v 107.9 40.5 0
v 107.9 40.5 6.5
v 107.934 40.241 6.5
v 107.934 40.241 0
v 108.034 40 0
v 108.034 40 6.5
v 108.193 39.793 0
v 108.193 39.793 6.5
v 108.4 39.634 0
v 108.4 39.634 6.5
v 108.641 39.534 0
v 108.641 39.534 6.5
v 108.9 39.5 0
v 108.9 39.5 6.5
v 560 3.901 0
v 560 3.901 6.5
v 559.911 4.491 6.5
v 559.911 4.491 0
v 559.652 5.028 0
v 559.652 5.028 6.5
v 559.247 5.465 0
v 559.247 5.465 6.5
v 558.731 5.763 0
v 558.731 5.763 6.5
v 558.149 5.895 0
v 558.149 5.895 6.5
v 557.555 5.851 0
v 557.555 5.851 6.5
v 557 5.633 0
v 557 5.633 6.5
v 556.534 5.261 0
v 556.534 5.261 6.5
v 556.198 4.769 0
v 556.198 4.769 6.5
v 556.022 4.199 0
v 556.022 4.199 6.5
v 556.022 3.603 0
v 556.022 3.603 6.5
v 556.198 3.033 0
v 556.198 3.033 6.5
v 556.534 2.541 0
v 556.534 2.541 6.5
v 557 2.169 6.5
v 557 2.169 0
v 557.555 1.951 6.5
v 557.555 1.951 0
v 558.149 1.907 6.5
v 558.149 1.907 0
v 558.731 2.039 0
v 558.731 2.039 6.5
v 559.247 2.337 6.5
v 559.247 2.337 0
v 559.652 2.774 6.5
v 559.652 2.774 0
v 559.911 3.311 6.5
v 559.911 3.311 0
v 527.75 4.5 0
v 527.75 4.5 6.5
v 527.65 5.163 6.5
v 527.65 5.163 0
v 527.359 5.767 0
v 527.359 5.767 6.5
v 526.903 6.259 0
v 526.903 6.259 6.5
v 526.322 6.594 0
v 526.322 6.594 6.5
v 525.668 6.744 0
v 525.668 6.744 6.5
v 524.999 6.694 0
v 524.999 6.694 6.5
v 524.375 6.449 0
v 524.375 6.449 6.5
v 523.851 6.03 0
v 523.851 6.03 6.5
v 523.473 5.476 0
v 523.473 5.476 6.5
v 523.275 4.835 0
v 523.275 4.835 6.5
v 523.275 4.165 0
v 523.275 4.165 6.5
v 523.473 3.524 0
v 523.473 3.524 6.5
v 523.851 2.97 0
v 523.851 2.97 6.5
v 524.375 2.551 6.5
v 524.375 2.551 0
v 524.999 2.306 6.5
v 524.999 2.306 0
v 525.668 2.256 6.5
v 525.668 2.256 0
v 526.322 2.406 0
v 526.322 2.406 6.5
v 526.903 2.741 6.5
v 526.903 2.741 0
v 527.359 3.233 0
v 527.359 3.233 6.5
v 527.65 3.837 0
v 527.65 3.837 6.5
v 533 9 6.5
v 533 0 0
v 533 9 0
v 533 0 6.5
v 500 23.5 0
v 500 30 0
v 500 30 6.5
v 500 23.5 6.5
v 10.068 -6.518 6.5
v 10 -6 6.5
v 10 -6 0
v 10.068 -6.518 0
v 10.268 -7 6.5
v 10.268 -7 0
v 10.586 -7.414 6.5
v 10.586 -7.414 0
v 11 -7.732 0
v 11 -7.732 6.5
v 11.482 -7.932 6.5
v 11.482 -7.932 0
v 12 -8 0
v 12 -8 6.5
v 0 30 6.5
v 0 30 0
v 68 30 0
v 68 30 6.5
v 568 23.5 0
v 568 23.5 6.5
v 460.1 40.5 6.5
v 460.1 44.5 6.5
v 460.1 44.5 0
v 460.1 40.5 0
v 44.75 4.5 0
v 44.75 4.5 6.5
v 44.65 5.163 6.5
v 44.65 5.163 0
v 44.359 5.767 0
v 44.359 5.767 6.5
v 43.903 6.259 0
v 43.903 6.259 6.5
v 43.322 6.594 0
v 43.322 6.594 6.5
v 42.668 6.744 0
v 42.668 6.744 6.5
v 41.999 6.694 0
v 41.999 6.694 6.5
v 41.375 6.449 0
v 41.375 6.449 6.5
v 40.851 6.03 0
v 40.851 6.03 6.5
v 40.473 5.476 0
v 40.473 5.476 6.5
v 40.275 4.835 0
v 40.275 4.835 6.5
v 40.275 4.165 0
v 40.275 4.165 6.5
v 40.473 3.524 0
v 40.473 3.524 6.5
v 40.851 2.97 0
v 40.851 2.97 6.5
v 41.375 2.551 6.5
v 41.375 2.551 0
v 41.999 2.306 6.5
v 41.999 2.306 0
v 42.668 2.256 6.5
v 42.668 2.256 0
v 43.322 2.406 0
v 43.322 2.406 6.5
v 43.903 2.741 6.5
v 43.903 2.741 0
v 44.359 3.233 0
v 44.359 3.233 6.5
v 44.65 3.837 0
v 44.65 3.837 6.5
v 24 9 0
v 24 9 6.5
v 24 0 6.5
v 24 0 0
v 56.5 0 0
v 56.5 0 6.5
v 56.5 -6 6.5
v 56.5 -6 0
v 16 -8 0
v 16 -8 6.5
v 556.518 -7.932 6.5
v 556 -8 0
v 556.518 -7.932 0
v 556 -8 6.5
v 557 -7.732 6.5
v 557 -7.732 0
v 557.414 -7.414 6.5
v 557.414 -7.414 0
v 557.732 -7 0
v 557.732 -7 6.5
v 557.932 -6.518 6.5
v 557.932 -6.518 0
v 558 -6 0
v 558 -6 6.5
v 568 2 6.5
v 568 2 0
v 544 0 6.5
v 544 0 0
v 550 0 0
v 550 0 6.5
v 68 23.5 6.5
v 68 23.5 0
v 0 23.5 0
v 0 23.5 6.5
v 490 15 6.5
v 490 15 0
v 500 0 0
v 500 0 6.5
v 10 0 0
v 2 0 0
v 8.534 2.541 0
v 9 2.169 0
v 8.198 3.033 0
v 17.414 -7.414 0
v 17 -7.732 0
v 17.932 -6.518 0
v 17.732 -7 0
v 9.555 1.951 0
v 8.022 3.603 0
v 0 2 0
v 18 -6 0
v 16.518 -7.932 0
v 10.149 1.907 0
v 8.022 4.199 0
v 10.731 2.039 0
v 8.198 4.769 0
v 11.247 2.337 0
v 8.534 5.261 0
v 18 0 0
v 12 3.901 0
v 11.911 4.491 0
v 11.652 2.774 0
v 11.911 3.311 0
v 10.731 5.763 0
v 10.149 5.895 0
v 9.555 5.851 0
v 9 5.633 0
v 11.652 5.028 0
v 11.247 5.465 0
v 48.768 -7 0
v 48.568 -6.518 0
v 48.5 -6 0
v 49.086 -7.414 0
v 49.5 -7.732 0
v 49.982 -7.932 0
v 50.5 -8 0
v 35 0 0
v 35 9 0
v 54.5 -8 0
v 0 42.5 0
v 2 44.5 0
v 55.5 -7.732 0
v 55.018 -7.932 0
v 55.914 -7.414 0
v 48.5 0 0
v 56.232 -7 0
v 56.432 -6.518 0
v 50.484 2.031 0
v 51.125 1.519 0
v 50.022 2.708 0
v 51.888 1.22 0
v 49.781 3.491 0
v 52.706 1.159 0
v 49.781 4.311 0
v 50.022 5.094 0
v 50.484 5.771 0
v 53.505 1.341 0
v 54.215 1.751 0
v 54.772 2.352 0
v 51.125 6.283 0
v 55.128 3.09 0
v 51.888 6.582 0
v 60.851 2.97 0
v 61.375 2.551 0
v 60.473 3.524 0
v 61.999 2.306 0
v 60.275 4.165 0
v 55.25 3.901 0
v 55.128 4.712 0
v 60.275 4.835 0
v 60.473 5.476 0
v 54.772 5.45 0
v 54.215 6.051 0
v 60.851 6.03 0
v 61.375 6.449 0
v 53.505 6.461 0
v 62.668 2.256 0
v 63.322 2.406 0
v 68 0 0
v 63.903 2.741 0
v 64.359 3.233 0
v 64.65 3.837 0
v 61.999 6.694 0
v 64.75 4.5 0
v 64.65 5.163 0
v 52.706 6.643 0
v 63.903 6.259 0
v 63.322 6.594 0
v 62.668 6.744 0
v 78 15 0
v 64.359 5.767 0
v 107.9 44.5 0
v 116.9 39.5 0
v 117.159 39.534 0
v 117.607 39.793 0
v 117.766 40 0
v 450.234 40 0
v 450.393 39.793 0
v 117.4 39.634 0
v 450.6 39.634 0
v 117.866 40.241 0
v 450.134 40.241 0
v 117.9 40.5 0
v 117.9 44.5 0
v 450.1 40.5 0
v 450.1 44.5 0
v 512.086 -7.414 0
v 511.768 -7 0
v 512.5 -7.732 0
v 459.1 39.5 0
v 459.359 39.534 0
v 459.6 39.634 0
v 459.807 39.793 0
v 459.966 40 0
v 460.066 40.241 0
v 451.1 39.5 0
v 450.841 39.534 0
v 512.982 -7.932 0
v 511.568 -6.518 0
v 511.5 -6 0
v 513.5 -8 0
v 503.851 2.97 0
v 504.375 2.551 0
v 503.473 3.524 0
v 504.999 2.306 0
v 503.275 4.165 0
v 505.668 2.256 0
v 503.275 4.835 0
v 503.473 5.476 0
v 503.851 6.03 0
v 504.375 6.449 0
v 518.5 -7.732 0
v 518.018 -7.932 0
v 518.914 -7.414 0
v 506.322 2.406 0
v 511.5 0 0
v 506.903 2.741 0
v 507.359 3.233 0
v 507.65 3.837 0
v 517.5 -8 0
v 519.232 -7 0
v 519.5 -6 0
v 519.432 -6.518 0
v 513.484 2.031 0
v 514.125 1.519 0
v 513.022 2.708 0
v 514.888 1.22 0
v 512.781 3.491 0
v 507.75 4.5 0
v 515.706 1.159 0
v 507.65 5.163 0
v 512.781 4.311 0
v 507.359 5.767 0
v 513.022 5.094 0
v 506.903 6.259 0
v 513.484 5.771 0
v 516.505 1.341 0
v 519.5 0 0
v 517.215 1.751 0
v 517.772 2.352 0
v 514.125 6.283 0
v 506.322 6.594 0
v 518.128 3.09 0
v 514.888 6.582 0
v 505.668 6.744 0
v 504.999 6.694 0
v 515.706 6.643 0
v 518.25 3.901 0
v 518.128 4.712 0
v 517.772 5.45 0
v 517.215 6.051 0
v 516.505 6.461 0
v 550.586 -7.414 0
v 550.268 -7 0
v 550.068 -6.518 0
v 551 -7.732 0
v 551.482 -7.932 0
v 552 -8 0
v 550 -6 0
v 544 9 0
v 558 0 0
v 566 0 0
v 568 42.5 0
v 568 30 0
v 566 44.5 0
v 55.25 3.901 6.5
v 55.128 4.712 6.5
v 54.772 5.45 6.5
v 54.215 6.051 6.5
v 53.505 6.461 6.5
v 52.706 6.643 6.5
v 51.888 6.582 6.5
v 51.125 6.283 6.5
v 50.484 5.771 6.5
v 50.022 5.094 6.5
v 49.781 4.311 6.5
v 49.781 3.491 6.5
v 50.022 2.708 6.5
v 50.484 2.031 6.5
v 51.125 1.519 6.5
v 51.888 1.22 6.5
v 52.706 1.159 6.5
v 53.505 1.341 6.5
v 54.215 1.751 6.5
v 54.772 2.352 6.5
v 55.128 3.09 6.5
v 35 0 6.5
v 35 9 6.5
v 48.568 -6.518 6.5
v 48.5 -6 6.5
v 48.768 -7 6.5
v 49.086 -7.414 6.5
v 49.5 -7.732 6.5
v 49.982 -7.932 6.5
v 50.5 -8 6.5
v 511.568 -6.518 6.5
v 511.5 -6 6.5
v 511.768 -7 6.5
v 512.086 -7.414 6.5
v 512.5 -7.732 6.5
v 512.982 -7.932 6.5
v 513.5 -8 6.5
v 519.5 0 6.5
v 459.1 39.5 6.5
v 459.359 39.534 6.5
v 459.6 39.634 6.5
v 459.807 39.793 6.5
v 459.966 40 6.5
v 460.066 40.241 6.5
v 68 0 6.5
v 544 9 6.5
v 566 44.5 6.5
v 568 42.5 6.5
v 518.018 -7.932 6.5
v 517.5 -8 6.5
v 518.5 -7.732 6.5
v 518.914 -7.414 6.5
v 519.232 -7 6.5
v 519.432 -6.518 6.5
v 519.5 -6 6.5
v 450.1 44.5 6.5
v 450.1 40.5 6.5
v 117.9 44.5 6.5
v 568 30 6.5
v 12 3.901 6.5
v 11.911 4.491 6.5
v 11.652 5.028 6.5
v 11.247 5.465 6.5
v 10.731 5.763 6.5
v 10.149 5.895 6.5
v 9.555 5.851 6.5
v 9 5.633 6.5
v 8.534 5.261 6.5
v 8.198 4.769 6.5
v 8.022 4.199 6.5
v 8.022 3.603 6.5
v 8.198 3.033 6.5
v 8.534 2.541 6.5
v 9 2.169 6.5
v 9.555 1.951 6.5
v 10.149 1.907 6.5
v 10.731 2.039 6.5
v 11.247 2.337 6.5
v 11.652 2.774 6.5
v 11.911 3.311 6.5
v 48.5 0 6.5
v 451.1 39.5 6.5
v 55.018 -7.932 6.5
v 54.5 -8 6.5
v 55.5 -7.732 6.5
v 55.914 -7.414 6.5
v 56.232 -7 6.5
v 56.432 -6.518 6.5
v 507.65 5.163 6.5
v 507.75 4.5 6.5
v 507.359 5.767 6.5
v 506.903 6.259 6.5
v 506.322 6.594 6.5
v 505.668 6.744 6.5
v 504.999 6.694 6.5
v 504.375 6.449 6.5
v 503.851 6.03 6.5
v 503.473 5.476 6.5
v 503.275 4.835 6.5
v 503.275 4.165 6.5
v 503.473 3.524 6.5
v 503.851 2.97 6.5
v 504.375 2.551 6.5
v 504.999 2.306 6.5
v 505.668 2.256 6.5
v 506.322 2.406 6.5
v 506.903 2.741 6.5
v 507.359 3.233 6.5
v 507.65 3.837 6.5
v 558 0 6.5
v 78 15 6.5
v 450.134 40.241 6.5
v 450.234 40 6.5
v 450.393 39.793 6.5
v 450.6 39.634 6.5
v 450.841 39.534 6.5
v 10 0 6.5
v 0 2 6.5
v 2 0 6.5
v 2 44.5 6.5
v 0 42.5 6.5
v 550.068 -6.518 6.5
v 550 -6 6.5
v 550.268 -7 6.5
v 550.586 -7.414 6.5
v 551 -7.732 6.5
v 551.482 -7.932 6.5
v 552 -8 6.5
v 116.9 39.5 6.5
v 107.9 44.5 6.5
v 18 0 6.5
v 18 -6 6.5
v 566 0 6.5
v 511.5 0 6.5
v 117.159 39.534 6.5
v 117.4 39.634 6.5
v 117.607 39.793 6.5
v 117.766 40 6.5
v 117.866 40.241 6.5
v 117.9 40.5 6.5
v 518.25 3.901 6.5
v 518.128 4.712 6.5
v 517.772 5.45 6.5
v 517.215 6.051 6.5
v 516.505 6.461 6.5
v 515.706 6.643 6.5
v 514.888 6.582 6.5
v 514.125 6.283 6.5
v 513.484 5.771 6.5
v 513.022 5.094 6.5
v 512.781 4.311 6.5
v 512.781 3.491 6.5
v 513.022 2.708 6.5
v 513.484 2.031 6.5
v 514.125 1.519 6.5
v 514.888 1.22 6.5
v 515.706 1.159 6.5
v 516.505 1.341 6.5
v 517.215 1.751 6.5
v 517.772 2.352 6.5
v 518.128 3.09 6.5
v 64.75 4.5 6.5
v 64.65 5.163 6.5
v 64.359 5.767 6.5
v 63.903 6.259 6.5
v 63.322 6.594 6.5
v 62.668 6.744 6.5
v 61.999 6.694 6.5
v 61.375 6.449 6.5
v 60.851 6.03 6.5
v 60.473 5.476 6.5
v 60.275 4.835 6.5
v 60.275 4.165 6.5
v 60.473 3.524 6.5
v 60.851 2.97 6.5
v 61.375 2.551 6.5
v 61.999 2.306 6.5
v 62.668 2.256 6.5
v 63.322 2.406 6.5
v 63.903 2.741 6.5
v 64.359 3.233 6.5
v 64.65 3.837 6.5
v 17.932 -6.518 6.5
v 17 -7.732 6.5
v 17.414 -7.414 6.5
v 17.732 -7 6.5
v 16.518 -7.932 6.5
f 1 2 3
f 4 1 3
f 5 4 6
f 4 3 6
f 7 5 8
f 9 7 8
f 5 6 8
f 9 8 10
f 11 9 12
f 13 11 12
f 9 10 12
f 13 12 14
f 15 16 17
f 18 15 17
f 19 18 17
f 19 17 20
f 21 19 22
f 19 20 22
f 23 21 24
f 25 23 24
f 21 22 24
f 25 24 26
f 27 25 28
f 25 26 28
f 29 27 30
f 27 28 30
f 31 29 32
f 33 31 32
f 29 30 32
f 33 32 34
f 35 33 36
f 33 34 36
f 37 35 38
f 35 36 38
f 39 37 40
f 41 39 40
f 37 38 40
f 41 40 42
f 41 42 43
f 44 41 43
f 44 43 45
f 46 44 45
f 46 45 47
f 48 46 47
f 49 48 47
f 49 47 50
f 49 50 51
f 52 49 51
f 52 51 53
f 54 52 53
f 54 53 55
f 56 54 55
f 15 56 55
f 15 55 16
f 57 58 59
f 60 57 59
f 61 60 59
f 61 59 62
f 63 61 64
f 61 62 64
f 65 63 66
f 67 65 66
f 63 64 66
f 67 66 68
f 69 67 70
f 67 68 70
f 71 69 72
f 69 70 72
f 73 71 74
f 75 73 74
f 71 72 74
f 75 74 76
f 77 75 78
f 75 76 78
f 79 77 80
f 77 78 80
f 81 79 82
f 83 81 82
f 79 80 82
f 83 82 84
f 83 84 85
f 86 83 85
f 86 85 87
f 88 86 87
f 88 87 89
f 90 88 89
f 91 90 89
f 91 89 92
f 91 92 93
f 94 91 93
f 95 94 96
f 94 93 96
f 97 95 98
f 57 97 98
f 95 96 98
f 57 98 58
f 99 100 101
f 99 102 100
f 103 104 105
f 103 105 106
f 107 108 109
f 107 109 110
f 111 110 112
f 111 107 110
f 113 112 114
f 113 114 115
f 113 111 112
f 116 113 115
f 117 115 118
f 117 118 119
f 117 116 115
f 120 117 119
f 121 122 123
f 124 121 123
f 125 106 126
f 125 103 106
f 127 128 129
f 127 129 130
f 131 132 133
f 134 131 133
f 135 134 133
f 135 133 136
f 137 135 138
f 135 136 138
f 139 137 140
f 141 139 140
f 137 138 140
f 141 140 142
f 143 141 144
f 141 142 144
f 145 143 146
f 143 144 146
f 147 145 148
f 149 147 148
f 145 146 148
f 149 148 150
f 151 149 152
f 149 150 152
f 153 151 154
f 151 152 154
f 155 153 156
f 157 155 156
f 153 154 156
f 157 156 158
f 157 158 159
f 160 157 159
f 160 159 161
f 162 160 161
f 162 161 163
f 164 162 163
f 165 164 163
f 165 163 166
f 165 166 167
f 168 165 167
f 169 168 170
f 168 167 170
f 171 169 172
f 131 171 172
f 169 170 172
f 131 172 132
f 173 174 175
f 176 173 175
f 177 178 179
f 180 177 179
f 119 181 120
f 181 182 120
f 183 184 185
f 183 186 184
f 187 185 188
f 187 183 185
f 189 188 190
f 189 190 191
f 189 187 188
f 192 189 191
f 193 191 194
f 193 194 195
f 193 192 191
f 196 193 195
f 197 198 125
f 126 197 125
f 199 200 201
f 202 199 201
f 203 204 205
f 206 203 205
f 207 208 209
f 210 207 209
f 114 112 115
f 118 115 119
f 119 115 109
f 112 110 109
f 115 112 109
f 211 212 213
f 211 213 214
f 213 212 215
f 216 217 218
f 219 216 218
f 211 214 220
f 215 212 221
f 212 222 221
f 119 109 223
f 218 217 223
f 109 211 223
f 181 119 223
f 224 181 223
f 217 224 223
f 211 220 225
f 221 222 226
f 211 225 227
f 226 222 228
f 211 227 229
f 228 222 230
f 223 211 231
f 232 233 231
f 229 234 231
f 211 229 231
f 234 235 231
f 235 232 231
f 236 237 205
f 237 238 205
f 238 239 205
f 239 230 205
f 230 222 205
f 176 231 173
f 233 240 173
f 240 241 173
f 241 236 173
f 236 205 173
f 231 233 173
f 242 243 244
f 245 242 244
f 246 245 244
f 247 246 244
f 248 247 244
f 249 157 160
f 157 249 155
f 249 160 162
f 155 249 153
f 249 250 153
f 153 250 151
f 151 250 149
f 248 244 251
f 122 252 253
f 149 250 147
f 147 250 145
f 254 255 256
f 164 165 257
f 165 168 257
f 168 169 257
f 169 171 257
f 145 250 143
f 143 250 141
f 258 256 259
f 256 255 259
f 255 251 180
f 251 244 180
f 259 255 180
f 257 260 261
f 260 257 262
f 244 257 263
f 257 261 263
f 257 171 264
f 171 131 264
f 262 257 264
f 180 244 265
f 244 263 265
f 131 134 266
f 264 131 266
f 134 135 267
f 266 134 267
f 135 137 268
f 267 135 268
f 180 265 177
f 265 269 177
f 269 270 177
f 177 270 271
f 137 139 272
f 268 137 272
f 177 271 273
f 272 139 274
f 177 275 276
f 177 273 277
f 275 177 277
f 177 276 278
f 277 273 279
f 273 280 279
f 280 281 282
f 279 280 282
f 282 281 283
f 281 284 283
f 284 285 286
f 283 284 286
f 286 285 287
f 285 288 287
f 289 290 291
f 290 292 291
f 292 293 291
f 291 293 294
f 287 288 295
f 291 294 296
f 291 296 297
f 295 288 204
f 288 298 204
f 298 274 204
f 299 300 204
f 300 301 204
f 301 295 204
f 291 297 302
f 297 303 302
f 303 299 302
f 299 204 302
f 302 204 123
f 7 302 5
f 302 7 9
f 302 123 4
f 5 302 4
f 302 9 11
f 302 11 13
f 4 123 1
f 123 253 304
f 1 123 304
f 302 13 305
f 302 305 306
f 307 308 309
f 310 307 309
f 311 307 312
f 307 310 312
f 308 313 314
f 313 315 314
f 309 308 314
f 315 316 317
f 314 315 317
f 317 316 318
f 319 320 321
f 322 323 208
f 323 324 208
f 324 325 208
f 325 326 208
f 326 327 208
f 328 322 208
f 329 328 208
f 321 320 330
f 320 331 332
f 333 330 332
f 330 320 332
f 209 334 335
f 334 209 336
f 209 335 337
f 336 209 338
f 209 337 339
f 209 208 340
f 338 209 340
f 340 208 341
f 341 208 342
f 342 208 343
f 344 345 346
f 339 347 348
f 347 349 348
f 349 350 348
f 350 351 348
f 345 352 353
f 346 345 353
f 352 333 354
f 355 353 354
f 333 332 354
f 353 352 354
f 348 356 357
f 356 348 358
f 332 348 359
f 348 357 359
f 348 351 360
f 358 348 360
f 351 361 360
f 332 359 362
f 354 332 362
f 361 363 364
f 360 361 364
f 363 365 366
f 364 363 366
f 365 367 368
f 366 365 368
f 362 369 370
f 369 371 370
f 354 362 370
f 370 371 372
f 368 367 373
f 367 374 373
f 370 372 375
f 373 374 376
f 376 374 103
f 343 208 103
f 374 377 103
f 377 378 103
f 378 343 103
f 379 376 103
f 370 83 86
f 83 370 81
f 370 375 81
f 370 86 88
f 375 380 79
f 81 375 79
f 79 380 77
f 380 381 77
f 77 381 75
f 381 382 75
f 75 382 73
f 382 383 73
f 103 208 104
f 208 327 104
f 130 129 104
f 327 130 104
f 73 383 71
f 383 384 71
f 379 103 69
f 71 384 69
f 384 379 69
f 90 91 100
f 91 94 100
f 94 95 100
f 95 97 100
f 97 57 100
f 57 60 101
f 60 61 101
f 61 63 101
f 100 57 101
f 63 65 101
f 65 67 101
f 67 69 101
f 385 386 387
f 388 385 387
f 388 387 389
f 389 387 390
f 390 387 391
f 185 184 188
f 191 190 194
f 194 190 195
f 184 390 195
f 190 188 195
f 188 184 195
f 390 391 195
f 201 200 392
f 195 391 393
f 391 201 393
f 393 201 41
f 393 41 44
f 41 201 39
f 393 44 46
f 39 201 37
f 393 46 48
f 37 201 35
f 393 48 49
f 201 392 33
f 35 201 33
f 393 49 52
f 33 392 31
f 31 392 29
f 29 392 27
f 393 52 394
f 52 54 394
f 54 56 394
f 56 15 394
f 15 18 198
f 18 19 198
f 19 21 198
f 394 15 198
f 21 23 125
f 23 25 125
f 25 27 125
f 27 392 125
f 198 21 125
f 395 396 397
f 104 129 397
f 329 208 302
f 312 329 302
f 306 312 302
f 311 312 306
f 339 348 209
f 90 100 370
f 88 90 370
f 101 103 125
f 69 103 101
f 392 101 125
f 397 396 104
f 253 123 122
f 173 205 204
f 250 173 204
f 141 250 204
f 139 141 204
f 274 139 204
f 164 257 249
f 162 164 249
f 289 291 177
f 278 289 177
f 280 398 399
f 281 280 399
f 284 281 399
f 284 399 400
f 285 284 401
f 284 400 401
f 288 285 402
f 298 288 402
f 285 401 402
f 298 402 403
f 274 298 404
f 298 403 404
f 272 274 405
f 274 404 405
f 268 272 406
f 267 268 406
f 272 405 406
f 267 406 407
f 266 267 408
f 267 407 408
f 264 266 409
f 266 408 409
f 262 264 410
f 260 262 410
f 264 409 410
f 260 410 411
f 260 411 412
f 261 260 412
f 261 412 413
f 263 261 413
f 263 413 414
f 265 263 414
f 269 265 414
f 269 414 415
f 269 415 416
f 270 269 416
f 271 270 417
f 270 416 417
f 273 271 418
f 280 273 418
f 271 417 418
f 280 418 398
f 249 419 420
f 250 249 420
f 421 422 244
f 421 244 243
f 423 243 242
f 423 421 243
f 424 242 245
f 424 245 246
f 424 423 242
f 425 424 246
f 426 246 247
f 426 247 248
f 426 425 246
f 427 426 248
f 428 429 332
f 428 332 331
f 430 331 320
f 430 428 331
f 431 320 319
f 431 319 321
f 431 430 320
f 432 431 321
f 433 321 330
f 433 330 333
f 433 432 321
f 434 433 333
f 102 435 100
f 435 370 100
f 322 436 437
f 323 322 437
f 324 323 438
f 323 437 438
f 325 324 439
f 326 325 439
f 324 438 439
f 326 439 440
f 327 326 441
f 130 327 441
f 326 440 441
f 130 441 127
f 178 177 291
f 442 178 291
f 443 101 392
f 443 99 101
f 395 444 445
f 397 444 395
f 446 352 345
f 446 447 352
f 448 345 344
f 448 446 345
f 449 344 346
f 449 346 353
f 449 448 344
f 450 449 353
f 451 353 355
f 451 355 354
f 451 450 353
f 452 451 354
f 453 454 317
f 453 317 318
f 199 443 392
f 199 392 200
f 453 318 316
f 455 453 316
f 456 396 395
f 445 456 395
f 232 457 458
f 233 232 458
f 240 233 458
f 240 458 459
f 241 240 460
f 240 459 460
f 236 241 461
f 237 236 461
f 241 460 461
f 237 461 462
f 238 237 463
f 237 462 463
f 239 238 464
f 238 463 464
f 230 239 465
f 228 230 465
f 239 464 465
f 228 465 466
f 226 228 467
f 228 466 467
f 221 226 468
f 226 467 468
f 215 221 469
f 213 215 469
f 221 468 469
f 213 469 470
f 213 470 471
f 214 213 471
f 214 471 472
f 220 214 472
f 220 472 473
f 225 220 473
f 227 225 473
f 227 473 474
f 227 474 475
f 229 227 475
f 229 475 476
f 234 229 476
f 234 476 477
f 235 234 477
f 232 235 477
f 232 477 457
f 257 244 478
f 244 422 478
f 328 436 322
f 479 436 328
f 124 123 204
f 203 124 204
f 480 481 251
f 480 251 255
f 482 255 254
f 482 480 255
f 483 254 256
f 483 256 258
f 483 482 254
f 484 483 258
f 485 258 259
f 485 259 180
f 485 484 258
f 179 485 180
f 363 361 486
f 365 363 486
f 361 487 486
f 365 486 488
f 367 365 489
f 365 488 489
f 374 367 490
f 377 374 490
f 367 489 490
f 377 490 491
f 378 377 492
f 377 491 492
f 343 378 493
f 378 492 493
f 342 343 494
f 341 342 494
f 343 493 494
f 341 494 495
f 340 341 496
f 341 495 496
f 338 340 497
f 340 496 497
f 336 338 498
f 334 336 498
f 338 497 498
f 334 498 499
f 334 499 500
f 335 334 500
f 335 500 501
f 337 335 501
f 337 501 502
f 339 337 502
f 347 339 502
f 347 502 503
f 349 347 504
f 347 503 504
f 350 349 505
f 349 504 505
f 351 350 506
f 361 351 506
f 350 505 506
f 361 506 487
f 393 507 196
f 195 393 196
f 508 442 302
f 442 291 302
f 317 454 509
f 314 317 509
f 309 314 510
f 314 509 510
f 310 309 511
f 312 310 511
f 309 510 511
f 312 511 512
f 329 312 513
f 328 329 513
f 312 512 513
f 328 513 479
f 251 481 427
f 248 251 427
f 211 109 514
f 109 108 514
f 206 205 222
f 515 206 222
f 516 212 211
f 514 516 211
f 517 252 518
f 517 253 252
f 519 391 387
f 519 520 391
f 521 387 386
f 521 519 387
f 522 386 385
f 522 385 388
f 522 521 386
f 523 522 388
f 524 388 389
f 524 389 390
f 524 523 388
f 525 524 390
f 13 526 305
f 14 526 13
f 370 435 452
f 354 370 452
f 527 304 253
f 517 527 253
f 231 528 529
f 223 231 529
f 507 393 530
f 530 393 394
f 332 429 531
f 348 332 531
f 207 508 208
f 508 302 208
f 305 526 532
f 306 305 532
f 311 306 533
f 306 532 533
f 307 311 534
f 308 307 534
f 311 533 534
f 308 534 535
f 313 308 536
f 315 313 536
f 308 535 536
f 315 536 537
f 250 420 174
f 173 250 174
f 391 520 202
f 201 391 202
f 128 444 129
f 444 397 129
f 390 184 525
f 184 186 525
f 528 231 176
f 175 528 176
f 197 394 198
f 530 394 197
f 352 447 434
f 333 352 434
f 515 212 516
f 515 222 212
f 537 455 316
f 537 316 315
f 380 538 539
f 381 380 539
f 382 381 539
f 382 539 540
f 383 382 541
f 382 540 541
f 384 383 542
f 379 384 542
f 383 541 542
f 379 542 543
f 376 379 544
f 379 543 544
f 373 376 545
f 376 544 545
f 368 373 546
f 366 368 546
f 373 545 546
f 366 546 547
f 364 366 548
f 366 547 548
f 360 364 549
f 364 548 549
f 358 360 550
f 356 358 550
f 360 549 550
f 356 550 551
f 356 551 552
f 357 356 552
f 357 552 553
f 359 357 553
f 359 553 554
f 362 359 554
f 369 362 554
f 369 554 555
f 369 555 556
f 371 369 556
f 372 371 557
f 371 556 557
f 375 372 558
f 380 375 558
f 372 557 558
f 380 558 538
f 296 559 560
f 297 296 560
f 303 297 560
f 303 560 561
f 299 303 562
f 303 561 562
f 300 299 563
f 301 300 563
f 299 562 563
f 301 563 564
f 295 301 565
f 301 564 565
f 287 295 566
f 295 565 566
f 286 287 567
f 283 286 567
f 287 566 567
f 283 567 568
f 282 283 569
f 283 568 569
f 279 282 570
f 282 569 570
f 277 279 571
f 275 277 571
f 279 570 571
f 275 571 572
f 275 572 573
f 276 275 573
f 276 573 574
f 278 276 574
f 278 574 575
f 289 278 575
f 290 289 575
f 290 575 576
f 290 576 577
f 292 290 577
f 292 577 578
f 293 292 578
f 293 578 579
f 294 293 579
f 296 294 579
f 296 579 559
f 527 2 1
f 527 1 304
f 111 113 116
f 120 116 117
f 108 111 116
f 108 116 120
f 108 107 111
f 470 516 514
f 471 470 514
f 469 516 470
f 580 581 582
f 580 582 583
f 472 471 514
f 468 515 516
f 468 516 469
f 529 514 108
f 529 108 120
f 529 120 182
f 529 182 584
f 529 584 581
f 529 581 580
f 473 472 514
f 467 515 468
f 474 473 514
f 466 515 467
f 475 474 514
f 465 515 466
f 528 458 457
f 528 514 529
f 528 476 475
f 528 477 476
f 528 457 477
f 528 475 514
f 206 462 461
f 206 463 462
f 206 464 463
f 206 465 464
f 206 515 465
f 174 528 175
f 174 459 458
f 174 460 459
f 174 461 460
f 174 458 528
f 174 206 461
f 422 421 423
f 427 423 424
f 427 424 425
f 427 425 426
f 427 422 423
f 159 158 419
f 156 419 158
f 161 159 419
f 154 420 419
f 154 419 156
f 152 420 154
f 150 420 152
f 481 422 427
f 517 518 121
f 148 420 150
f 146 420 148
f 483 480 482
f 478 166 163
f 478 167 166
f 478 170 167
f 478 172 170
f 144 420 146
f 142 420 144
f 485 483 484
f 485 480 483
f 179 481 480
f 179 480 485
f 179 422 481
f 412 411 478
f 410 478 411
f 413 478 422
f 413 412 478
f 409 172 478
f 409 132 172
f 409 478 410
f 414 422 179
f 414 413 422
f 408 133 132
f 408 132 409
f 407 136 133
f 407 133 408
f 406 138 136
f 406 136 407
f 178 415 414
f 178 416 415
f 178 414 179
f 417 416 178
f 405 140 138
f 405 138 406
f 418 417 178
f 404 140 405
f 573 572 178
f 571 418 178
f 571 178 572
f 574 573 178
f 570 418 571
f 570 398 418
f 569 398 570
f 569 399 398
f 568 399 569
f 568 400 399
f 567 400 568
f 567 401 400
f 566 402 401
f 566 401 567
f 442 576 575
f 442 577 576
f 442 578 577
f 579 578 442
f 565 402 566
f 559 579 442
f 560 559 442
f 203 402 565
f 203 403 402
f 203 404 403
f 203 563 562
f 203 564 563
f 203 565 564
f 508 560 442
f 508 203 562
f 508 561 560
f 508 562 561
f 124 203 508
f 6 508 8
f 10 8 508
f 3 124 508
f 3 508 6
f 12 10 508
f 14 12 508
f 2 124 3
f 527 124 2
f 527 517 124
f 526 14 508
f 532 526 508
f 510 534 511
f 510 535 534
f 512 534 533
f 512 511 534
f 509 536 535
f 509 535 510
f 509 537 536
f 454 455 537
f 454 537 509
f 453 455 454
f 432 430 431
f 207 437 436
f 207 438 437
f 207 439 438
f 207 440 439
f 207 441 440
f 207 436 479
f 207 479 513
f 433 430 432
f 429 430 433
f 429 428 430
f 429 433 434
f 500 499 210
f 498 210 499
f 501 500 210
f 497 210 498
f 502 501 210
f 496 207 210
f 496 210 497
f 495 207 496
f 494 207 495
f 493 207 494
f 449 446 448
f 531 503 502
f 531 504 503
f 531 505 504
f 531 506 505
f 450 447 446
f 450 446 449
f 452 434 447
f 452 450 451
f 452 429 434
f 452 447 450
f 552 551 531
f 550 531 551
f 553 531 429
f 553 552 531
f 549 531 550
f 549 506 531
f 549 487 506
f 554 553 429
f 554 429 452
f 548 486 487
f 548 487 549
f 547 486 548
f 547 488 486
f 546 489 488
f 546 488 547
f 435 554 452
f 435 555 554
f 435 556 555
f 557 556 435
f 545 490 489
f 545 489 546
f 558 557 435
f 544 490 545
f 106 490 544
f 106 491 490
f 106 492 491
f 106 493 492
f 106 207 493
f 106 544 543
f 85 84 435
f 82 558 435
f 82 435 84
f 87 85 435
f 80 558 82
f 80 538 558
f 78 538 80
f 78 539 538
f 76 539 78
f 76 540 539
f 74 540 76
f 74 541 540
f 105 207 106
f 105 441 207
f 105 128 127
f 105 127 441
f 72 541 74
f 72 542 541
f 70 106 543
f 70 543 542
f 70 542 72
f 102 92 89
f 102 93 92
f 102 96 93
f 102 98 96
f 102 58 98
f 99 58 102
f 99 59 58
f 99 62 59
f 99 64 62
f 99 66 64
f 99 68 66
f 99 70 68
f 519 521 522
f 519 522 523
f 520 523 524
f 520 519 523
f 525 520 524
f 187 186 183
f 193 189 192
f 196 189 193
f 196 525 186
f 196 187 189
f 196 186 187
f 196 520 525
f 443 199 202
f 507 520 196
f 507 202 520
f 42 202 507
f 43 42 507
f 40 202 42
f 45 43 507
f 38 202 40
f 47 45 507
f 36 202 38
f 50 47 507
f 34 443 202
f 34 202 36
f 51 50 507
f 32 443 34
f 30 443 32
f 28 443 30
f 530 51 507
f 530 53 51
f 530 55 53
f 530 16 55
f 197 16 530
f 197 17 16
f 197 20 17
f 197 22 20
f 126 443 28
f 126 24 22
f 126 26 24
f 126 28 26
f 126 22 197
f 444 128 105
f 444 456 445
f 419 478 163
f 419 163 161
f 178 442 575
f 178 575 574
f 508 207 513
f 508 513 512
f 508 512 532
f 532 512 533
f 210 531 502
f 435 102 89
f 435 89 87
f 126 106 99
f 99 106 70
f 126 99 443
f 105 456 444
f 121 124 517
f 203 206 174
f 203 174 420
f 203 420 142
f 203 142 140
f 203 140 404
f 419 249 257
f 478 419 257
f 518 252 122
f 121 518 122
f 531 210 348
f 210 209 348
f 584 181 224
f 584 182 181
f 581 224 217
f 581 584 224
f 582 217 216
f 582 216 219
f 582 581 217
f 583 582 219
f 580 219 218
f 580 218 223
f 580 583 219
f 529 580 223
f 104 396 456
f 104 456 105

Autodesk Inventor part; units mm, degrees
ref_plane "YZ Plane" through (0, 0, 0) normal (1, 0, 0) x (0, 1, 0)
ref_plane "XZ Plane" through (0, 0, 0) normal (0, 1, 0) x (-1, 0, 0)
ref_plane "XY Plane" through (0, 0, 0) normal (0, 0, 1) x (1, 0, 0)
sketch "Sketch1" plane through (0, 0, 0) normal (0, 0, 1) x (1, 0, 0)
  line L0 (568, 44.5) -> (0, 44.5)
  line L1 (68, 0) -> (78, 15)
  line L2 (78, 15) -> (490, 15)
  line L3 (490, 15) -> (500, 0)
  line L4 (0, 0) -> (68, 0)
  line L5 (500, 0) -> (568, 0)
  line L6 (0, 30) -> (68, 30)
  line L7 (68, 30) -> (68, 23.5)
  line L8 (68, 23.5) -> (0, 23.5)
  line L9 (0, 44.5) -> (0, 30)
  line L10 (0, 23.5) -> (0, 0)
  line L11 (568, 30) -> (500, 30)
  line L12 (500, 30) -> (500, 23.5)
  line L13 (500, 23.5) -> (568, 23.5)
  line L14 (568, 0) -> (568, 23.5)
  line L15 (568, 30) -> (568, 44.5)
  dimension "d3" = 6.5
  dimension "d4" = 68
  dimension "d5" = 68
  dimension "d6" = 568
  dimension "d7" = 15
  dimension "d8" = 23.5
  dimension "d9" = 14.5
  dimension "d12" = 10
  dimension "d13" = 10
  dimension "d14" = 10
  dimension "d15" = 10
extrude "Extrusion1" add sketch "Sketch1" along normal blind 6.5
sketch "Sketch2" plane through (0, 0, 6.5) normal (0, 0, 1) x (1, 0, 0)
  line L0 (0, 0) -> (68, 0) projected
  line L1 (500, 0) -> (568, 0) projected
  line L2 (568, 0) -> (568, 23.5) projected
  line L3 (568, 30) -> (568, 44.5) projected
  line L4 (568, 44.5) -> (0, 44.5) projected
  line L5 (0, 44.5) -> (0, 30) projected
  line L6 (0, 23.5) -> (0, 0) projected
  line L7 (24, 0) -> (35, 0)
  line L8 (35, 0) -> (35, 9)
  line L9 (35, 9) -> (24, 9)
  line L10 (24, 9) -> (24, 0)
  circle A0 centre (42.5, 4.5) radius 2.25
  circle A1 centre (52.5, 3.901) radius 2.75
  circle A2 centre (62.5, 4.5) radius 2.25
  line L11 (544, 0) -> (533, 0)
  line L12 (533, 0) -> (533, 9)
  line L13 (533, 9) -> (544, 9)
  line L14 (544, 9) -> (544, 0)
  circle A3 centre (505.5, 4.5) radius 2.25
  circle A4 centre (515.5, 3.901) radius 2.75
  circle A5 centre (525.5, 4.5) radius 2.25
  line L15 (107.9, 44.5) -> (117.9, 44.5)
  line L16 (117.9, 44.5) -> (117.9, 40.5)
  line L17 (116.9, 39.5) -> (108.9, 39.5)
  line L18 (107.9, 40.5) -> (107.9, 44.5)
  line L19 (450.1, 44.5) -> (460.1, 44.5)
  line L20 (460.1, 44.5) -> (460.1, 40.5)
  line L21 (459.1, 39.5) -> (451.1, 39.5)
  line L22 (450.1, 40.5) -> (450.1, 44.5)
  arc A6 (107.9, 40.5) -> (108.9, 39.5) centre (108.9, 40.5) ccw
  arc A7 (116.9, 39.5) -> (117.9, 40.5) centre (116.9, 40.5) ccw
  arc A8 (450.1, 40.5) -> (451.1, 39.5) centre (451.1, 40.5) ccw
  arc A9 (459.1, 39.5) -> (460.1, 40.5) centre (459.1, 40.5) ccw
  circle A10 centre (29.5, 3.901) radius 7.5 construction
  point P0 (538.5, 9)
  point P1 (35, 4.5)
  point P2 (112.9, 39.5)
  point P3 (455.1, 39.5)
  dimension "d16" = 11
  dimension "d18" = 4.5
  dimension "d19" = 5.5
  dimension "d20" = 11
  dimension "d21" = 1
  dimension "d22" = 10
  dimension "d23" = 10
  dimension "d27" = 24
  dimension "d29" = 23
  dimension "d30" = 24
  dimension "d31" = 10
  dimension "d32" = 10
  dimension "d33" = 10
  dimension "d34" = 10
  dimension "d35" = 9
  dimension "d38" = 15
  dimension "d39" = 23
  dimension "d49" = 112.9
  dimension "d50" = 112.9
  dimension "d63" = 5
extrude "Extrusion2" cut sketch "Sketch2" against normal through all
chamfer "Chamfer1" distance 2 angle 45 4 edges at (0, 44.5, 3.25) (0, 0, 3.25) (568, 44.5, 3.25) (568, 0, 3.25)
sketch "Sketch3" plane through (0, 0, 6.5) normal (0, 0, 1) x (1, 0, 0)
  line L0 (568, 2) -> (568, 23.5) projected
  line L1 (0, 23.5) -> (0, 2) projected
  circle A0 centre (52.5, 3.901) radius 2.75 projected
  circle A1 centre (10, 3.901) radius 2
  circle A2 centre (558, 3.901) radius 2
  point P0 (0, 0)
  dimension "d43" = 4
  dimension "d44" = 10
  dimension "d45" = 4
  dimension "d46" = 10
extrude "Extrusion3" cut sketch "Sketch3" against normal through all contours A1 | A2
sketch "Sketch4" plane through (0, 0, 6.5) normal (0, 0, 1) x (1, 0, 0)
  line L0 (568, 2) -> (568, 23.5) projected
  line L1 (0, 23.5) -> (0, 2) projected
  line L2 (2, 0) -> (24, 0) projected
  line L3 (35, 0) -> (68, 0) projected
  line L4 (500, 0) -> (533, 0) projected
  line L5 (544, 0) -> (566, 0) projected
  line L6 (10, 0) -> (18, 0)
  line L7 (18, 0) -> (18, -6)
  line L8 (16, -8) -> (12, -8)
  line L9 (10, -6) -> (10, 0)
  line L10 (48.5, 0) -> (56.5, 0)
  line L11 (56.5, 0) -> (56.5, -6)
  line L12 (54.5, -8) -> (50.5, -8)
  line L13 (48.5, -6) -> (48.5, 0)
  line L14 (511.5, 0) -> (519.5, 0)
  line L15 (519.5, 0) -> (519.5, -6)
  line L16 (517.5, -8) -> (513.5, -8)
  line L17 (511.5, -6) -> (511.5, 0)
  line L18 (550, 0) -> (558, 0)
  line L19 (558, 0) -> (558, -6)
  line L20 (556, -8) -> (552, -8)
  line L21 (550, -6) -> (550, 0)
  arc A0 (10, -6) -> (12, -8) centre (12, -6) ccw
  arc A1 (16, -8) -> (18, -6) centre (16, -6) ccw
  arc A2 (48.5, -6) -> (50.5, -8) centre (50.5, -6) ccw
  arc A3 (54.5, -8) -> (56.5, -6) centre (54.5, -6) ccw
  arc A4 (511.5, -6) -> (513.5, -8) centre (513.5, -6) ccw
  arc A5 (517.5, -8) -> (519.5, -6) centre (517.5, -6) ccw
  arc A6 (550, -6) -> (552, -8) centre (552, -6) ccw
  arc A7 (556, -8) -> (558, -6) centre (556, -6) ccw
  point P0 (0, 0)
  dimension "d51" = 2
  dimension "d52" = 8
  dimension "d53" = 8
  dimension "d54" = 8
  dimension "d55" = 8
  dimension "d56" = 8
  dimension "d57" = 10
  dimension "d58" = 30.5
  dimension "d59" = 10
  dimension "d60" = 30.5
extrude "Extrusion4" add sketch "Sketch4" against normal blind 6.5
equation "\"d5\" = d4"
equation "\"d20\" = d16"
equation "\"d23\" = d22"
equation "\"d30\" = d27"
equation "\"d50\" = d49"
equation "\"d45\" = d43"
equation "\"d46\" = d44"
equation "\"d59\" = d57"
equation "\"d60\" = d58"
properties part number "x_axis_chain_holder" material "Plywood, Finish"
